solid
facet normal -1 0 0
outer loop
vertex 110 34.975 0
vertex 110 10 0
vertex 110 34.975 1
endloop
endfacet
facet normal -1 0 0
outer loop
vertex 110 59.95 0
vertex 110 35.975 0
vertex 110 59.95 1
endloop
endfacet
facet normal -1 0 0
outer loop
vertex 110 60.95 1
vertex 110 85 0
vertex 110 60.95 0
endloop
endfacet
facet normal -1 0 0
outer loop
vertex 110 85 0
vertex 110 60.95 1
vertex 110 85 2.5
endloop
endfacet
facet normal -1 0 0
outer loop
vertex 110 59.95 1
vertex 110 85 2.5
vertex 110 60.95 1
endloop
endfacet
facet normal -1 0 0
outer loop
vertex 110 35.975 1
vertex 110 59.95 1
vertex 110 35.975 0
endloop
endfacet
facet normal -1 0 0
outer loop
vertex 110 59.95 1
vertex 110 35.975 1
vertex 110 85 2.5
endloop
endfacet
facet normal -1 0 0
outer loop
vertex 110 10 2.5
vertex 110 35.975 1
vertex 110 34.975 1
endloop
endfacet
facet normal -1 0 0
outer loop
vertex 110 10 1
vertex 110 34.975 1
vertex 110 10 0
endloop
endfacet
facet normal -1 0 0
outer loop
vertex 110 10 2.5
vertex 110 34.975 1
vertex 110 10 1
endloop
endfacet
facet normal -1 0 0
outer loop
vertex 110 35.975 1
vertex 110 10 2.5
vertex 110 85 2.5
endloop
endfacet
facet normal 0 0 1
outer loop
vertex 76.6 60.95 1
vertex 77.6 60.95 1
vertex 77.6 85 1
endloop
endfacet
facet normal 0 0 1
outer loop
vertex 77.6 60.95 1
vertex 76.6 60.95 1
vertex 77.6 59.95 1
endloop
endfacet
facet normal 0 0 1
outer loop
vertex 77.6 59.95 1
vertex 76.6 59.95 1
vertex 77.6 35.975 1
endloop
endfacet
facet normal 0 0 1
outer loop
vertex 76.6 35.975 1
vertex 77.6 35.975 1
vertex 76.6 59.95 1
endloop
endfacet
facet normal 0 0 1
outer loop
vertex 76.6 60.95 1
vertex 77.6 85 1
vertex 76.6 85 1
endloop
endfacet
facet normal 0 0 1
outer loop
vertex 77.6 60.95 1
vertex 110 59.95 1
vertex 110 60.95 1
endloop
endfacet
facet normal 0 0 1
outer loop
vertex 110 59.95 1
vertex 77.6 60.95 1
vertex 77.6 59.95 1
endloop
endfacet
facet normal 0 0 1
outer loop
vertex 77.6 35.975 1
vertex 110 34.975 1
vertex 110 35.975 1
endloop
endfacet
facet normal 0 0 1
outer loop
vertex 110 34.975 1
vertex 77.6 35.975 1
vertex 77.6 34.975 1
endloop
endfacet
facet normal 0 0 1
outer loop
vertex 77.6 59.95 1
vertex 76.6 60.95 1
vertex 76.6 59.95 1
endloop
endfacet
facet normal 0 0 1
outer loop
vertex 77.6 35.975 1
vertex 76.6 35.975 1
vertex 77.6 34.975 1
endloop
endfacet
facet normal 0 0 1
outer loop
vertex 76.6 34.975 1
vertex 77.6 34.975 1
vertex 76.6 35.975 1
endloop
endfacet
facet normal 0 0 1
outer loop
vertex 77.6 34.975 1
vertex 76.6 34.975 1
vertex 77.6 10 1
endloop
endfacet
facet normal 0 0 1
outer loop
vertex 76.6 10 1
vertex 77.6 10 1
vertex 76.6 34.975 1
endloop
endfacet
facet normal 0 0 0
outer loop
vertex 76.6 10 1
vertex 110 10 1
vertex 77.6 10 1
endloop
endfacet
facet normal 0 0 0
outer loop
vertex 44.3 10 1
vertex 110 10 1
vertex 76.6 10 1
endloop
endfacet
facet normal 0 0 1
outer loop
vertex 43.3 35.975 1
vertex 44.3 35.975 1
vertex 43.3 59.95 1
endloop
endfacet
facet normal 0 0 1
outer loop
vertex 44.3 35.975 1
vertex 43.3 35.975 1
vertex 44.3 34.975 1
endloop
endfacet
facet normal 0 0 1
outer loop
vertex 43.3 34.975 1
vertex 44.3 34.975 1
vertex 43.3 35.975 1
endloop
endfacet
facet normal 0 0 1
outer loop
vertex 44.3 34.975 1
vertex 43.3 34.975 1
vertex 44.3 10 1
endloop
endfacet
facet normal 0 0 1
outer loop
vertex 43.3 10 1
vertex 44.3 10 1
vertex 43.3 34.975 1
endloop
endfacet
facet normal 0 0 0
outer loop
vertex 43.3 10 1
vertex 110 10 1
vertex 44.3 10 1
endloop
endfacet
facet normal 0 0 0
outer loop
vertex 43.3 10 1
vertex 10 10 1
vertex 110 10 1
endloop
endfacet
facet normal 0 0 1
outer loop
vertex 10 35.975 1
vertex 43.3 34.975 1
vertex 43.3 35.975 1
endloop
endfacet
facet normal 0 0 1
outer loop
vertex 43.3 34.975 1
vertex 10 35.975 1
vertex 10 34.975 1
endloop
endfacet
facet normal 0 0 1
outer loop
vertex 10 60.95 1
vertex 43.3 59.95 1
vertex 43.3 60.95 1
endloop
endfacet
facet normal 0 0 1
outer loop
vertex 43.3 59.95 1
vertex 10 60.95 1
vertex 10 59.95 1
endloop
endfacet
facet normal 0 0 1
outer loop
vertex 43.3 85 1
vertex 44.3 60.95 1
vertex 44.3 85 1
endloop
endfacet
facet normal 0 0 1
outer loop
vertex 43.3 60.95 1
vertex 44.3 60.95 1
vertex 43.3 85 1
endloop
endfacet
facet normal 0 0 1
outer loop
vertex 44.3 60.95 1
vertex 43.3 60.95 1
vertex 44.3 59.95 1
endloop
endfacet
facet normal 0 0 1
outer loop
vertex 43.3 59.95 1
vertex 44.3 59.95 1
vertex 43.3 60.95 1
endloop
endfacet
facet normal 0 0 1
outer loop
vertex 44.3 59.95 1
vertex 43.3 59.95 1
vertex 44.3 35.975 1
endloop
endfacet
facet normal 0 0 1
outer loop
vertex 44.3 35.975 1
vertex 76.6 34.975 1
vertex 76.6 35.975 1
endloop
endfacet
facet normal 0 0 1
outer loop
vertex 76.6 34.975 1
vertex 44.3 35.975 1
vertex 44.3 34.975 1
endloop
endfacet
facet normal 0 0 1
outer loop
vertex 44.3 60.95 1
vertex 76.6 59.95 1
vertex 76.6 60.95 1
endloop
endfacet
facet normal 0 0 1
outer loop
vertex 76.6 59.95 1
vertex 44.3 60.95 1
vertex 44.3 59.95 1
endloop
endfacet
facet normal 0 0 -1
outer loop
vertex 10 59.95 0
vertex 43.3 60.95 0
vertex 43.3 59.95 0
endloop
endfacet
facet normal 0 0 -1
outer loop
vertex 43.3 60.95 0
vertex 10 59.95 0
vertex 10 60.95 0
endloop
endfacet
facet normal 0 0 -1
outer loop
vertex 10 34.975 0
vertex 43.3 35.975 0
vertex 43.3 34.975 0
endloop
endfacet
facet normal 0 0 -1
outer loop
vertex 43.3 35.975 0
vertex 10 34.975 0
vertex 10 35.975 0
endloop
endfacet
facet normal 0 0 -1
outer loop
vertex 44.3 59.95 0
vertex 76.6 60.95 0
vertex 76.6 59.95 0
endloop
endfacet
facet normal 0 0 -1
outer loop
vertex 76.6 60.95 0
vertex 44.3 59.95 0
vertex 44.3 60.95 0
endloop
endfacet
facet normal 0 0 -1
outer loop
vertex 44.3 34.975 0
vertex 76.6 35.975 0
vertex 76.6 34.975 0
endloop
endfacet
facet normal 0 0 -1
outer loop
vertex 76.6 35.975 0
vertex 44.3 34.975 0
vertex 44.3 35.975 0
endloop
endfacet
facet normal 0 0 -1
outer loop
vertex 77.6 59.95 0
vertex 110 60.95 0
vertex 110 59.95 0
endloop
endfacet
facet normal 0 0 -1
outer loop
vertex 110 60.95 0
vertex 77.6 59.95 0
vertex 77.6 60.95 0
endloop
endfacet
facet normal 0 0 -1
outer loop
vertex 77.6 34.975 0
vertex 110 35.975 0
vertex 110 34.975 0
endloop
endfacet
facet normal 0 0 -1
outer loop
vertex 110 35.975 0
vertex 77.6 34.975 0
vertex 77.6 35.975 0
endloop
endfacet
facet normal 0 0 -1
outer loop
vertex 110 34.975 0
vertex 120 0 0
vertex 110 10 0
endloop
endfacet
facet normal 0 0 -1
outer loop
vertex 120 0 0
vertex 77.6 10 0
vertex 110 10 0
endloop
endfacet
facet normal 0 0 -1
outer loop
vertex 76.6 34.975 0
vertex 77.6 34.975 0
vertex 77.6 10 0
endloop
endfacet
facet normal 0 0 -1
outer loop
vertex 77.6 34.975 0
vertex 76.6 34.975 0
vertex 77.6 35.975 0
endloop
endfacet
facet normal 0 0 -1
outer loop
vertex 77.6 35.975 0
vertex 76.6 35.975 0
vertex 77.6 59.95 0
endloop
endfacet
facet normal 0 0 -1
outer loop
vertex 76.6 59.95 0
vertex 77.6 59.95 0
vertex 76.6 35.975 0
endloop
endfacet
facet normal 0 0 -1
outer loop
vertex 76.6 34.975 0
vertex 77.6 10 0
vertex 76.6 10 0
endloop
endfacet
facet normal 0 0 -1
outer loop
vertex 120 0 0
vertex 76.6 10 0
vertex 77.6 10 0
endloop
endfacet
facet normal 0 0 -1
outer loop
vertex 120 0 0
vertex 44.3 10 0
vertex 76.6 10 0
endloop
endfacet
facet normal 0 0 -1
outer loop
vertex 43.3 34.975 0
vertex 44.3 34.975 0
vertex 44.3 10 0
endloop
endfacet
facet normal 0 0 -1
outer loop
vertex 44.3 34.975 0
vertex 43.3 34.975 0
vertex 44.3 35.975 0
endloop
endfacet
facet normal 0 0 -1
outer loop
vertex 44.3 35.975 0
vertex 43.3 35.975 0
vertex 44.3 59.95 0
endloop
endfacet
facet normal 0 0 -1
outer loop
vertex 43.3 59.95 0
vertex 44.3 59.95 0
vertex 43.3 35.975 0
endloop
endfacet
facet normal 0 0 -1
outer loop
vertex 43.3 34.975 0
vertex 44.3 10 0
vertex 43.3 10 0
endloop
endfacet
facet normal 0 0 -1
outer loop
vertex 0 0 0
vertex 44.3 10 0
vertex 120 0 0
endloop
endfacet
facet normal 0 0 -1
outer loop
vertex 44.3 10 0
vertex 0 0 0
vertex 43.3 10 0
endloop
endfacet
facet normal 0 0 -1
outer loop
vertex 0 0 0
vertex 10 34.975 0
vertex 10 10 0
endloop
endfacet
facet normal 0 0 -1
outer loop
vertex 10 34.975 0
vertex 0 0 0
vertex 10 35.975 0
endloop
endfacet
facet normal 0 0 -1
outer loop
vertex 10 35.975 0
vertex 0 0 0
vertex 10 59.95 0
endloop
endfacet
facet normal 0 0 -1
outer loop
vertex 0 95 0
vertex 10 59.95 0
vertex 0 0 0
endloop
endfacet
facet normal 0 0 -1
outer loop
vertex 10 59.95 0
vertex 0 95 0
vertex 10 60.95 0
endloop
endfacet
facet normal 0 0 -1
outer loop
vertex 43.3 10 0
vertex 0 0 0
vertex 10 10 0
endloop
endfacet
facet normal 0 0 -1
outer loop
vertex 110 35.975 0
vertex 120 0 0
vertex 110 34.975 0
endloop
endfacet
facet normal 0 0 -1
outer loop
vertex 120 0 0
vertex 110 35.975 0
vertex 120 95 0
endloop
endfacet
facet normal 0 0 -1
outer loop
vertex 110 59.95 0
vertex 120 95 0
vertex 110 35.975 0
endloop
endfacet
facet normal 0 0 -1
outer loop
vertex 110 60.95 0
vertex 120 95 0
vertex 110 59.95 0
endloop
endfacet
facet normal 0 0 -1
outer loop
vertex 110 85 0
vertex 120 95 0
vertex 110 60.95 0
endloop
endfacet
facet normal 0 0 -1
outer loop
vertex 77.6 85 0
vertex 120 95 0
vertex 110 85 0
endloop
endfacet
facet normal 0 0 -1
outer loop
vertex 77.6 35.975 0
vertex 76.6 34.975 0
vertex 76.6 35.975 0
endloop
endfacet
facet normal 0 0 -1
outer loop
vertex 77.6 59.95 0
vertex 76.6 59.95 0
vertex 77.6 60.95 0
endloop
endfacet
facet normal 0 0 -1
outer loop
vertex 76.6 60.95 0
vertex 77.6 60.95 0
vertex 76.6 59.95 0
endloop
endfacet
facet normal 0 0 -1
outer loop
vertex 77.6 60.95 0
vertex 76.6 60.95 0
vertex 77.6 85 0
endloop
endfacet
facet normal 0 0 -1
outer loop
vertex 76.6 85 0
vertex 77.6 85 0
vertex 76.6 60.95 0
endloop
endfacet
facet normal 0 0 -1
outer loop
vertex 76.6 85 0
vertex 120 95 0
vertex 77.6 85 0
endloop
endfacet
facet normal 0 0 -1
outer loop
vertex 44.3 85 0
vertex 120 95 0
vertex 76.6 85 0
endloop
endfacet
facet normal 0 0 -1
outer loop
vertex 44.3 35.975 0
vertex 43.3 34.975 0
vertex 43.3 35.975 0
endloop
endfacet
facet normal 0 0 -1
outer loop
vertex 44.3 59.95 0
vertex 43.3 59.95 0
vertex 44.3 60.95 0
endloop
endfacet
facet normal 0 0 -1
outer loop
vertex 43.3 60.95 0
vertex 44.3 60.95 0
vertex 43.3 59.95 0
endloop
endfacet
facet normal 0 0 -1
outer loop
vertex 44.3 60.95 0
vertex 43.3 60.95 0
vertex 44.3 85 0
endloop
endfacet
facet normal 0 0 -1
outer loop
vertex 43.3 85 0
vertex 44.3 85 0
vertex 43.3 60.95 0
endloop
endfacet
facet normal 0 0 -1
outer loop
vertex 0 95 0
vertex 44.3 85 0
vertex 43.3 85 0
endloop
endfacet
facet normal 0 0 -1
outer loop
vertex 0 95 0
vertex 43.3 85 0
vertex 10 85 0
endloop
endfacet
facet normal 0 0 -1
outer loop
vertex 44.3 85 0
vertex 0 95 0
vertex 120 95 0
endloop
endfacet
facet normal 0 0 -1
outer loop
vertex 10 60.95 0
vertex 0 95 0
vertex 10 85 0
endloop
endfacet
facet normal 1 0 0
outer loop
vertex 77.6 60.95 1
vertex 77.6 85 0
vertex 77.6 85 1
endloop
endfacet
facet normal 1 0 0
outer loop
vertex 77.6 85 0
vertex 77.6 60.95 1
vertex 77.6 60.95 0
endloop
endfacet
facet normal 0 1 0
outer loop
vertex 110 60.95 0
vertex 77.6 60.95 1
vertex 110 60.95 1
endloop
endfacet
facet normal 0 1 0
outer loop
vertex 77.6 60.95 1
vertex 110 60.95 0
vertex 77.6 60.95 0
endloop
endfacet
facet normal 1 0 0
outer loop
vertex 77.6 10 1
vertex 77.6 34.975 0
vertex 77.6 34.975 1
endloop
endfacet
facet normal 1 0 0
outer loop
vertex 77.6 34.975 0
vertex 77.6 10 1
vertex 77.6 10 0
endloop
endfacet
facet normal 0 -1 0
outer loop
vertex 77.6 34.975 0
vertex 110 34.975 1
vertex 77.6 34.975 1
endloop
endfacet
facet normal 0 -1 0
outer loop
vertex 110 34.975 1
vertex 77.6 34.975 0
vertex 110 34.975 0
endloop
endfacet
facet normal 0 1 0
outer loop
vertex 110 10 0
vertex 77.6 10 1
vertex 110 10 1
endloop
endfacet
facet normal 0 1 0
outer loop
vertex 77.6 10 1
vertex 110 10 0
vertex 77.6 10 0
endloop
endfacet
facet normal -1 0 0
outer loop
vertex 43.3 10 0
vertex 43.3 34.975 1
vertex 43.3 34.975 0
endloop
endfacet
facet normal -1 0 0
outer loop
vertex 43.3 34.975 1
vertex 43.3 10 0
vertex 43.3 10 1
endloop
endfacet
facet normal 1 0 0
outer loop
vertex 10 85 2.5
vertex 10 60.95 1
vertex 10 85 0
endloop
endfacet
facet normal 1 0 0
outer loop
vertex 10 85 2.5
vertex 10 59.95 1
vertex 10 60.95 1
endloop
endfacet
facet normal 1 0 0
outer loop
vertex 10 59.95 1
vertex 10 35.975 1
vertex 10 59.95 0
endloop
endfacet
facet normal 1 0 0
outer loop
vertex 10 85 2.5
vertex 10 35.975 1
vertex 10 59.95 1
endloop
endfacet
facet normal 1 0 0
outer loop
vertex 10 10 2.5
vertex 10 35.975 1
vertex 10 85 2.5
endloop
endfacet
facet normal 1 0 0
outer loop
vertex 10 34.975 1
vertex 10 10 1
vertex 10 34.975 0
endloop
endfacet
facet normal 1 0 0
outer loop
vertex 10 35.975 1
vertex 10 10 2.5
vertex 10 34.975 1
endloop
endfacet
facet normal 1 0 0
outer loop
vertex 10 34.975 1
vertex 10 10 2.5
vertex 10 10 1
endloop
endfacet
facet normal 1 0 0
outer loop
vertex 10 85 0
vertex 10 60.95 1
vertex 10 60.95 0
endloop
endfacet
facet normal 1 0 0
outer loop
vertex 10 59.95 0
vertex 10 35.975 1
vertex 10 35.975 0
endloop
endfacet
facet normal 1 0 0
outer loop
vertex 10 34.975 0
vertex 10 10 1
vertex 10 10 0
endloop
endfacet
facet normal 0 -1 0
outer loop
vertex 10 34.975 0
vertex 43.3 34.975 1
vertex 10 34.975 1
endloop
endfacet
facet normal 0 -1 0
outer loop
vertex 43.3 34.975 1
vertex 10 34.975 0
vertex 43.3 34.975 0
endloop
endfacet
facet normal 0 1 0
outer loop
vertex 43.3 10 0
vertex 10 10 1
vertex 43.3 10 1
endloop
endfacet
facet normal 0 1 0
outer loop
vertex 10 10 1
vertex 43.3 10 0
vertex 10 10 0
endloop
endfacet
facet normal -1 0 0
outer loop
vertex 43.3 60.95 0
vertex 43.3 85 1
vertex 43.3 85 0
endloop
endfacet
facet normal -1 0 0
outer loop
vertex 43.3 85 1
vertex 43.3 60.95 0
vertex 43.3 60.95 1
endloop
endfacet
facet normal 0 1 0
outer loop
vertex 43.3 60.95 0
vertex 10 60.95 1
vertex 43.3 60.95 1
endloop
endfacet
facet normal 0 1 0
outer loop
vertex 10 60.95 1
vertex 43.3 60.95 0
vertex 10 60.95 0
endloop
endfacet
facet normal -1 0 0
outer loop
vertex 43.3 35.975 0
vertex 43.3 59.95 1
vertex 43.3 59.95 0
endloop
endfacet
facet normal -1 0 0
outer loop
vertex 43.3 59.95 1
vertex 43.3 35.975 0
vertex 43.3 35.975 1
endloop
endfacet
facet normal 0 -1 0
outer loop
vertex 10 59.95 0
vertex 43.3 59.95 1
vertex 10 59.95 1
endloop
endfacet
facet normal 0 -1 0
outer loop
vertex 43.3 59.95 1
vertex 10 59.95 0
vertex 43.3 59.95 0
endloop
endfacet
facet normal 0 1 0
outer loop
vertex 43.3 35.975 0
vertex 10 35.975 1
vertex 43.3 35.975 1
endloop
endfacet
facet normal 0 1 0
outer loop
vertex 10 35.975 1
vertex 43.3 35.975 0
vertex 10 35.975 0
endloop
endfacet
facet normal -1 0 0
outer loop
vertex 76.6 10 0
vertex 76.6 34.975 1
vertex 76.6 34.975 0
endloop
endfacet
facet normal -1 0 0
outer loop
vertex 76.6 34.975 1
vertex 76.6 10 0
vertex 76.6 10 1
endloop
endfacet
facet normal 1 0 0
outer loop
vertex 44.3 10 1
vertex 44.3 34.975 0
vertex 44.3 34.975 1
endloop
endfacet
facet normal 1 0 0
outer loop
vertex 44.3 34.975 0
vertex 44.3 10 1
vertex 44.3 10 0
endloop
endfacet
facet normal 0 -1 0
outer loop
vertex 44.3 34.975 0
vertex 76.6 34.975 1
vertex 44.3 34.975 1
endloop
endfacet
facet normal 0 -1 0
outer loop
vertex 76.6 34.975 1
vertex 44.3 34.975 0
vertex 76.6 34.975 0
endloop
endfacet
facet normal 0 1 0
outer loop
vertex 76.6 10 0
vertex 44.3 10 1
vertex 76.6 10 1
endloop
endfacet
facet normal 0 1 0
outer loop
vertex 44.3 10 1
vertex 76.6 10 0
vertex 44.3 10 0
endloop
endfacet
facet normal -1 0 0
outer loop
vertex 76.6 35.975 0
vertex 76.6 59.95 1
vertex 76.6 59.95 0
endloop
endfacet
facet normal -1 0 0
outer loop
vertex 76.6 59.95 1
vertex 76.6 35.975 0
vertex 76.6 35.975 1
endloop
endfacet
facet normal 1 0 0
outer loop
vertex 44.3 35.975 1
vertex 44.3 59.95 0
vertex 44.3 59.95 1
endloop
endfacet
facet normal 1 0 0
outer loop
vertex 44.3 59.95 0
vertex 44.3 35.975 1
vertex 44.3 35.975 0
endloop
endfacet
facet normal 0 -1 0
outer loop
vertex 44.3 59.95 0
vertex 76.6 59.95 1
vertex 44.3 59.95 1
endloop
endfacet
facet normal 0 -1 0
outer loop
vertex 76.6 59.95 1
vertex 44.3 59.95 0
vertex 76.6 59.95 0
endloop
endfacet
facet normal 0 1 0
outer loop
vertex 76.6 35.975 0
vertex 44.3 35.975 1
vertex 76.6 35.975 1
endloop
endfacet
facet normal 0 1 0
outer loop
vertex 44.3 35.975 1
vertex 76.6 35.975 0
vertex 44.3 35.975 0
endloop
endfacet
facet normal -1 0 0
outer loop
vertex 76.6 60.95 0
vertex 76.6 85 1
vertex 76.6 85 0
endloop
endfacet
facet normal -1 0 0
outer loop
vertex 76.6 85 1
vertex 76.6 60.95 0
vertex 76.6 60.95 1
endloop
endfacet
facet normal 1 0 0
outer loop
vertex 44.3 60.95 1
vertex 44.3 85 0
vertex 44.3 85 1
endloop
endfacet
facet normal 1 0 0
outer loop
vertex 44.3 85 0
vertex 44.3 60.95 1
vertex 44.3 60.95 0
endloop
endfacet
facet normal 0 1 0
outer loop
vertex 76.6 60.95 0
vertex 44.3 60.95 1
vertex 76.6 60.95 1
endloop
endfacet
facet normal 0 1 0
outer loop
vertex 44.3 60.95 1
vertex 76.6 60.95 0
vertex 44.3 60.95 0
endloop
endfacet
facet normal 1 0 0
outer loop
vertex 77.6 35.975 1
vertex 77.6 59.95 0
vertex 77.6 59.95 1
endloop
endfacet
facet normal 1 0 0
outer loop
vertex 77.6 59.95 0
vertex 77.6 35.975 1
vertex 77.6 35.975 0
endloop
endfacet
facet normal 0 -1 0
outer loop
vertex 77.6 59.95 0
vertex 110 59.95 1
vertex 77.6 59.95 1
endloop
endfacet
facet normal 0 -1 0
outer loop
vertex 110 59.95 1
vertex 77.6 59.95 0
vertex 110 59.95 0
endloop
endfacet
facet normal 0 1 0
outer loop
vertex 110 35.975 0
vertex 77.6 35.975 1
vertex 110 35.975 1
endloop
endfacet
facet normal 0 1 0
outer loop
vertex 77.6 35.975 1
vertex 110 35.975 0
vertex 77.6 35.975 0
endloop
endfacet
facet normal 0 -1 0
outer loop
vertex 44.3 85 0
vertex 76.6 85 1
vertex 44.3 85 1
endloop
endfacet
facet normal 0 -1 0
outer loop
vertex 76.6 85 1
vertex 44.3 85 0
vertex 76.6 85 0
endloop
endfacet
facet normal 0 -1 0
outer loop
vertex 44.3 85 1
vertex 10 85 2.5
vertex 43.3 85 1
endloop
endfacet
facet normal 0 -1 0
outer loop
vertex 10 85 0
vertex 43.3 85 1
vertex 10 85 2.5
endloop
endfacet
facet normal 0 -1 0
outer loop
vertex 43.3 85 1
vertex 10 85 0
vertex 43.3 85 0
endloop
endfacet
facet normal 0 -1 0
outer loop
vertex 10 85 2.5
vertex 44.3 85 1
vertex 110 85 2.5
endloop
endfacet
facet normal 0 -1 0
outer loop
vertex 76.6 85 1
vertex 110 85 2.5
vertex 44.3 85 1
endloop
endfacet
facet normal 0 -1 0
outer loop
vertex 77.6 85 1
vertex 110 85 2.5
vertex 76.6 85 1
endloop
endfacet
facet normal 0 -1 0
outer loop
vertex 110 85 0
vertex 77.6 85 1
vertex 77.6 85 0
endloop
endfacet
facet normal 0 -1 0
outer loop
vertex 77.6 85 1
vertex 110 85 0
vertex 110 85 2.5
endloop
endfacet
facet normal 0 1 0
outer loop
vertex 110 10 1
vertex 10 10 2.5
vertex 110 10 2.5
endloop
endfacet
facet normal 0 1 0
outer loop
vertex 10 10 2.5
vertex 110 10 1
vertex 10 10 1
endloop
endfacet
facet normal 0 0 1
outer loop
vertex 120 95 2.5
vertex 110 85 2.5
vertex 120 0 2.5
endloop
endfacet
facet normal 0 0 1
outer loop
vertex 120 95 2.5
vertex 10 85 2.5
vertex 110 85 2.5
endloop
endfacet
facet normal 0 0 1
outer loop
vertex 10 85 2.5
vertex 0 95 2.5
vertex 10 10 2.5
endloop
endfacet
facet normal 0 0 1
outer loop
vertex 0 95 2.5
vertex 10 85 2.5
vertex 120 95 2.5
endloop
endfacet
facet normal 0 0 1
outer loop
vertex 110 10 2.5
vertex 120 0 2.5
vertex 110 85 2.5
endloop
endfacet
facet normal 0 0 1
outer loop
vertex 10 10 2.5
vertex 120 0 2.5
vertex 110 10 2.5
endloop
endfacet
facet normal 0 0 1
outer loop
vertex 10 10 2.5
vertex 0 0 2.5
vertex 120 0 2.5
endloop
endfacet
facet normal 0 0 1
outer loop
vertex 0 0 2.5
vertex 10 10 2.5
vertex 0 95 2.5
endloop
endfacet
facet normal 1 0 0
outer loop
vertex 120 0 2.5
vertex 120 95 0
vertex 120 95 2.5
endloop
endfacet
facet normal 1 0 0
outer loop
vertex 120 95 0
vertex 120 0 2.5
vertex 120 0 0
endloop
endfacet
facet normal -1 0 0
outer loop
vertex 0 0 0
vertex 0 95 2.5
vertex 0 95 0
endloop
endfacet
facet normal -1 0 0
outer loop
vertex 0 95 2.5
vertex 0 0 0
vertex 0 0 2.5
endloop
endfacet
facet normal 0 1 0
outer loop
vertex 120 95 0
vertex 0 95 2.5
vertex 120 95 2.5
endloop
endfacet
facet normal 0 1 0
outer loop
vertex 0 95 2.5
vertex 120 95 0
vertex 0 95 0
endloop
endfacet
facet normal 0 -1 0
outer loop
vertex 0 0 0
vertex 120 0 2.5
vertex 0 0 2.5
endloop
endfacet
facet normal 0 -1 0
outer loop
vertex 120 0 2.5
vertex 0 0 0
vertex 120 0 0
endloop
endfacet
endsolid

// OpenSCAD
difference() {
  translate([60.0000000000, 47.5000000000, 1.2500000000]) {
    scale([120.0000000000, 95.0000000000, 2.5000000000]) {
      translate([-0.5000000000, -0.5000000000, -0.5000000000]) {
        cube([1, 1, 1]);
      }
    }
  }
  difference() {
    translate([60.0000000000, 47.4998625000, 1.2500000000]) {
      scale([100.0000000000, 75.0000000000, 2.5000000000]) {
        translate([-0.5000000000, -0.5000000000, -0.5000000000]) {
          cube([1, 1, 1]);
        }
      }
    }
    difference() {
      translate([60.0000000000, 47.4998625000, 0.5000000000]) {
        scale([100.0000000000, 75.0000000000, 1.0000000000]) {
          translate([-0.5000000000, -0.5000000000, -0.5000000000]) {
            cube([1, 1, 1]);
          }
        }
      }
      union() {
        union() {
          union() {
            union() {
              union() {
                union() {
                  union() {
                    union() {
                      translate([93.8000000000, 72.9750000000, 0.5000000000]) {
                        scale([32.4000000000, 24.0500000000, 1.0000000000]) {
                          translate([-0.5000000000, -0.5000000000, -0.5000000000]) {
                            cube([1, 1, 1]);
                          }
                        }
                      }
                      translate([93.8000000000, 22.4875000000, 0.5000000000]) {
                        rotate([0.0000000000, 0.0000000000, 0.0000000000]) {
                          scale([32.4000000000, 24.9750000000, 1.0000000000]) {
                            translate([-0.5000000000, -0.5000000000, -0.5000000000]) {
                              cube([1, 1, 1]);
                            }
                          }
                        }
                      }
                    }
                    translate([26.6500000000, 22.4875000000, 0.5000000000]) {
                      rotate([0.0000000000, 0.0000000000, 0.0000000000]) {
                        scale([33.3000000000, 24.9750000000, 1.0000000000]) {
                          translate([-0.5000000000, -0.5000000000, -0.5000000000]) {
                            cube([1, 1, 1]);
                          }
                        }
                      }
                    }
                  }
                  translate([26.6500000000, 72.9750000000, 0.5000000000]) {
                    scale([33.3000000000, 24.0500000000, 1.0000000000]) {
                      translate([-0.5000000000, -0.5000000000, -0.5000000000]) {
                        cube([1, 1, 1]);
                      }
                    }
                  }
                }
                translate([26.6500000000, 47.9625000000, 0.5000000000]) {
                  rotate([0.0000000000, 0.0000000000, 0.0000000000]) {
                    scale([33.3000000000, 23.9750000000, 1.0000000000]) {
                      translate([-0.5000000000, -0.5000000000, -0.5000000000]) {
                        cube([1, 1, 1]);
                      }
                    }
                  }
                }
              }
              translate([60.4500000000, 22.4875000000, 0.5000000000]) {
                rotate([0.0000000000, 0.0000000000, 0.0000000000]) {
                  scale([32.3000000000, 24.9750000000, 1.0000000000]) {
                    translate([-0.5000000000, -0.5000000000, -0.5000000000]) {
                      cube([1, 1, 1]);
                    }
                  }
                }
              }
            }
            translate([60.4500000000, 47.9625000000, 0.5000000000]) {
              rotate([0.0000000000, 0.0000000000, 0.0000000000]) {
                scale([32.3000000000, 23.9750000000, 1.0000000000]) {
                  translate([-0.5000000000, -0.5000000000, -0.5000000000]) {
                    cube([1, 1, 1]);
                  }
                }
              }
            }
          }
          translate([60.4500000000, 72.9750000000, 0.5000000000]) {
            scale([32.3000000000, 24.0500000000, 1.0000000000]) {
              translate([-0.5000000000, -0.5000000000, -0.5000000000]) {
                cube([1, 1, 1]);
              }
            }
          }
        }
        translate([93.8000000000, 47.9625000000, 0.5000000000]) {
          rotate([0.0000000000, 0.0000000000, 0.0000000000]) {
            scale([32.4000000000, 23.9750000000, 1.0000000000]) {
              translate([-0.5000000000, -0.5000000000, -0.5000000000]) {
                cube([1, 1, 1]);
              }
            }
          }
        }
      }
    }
  }
}
